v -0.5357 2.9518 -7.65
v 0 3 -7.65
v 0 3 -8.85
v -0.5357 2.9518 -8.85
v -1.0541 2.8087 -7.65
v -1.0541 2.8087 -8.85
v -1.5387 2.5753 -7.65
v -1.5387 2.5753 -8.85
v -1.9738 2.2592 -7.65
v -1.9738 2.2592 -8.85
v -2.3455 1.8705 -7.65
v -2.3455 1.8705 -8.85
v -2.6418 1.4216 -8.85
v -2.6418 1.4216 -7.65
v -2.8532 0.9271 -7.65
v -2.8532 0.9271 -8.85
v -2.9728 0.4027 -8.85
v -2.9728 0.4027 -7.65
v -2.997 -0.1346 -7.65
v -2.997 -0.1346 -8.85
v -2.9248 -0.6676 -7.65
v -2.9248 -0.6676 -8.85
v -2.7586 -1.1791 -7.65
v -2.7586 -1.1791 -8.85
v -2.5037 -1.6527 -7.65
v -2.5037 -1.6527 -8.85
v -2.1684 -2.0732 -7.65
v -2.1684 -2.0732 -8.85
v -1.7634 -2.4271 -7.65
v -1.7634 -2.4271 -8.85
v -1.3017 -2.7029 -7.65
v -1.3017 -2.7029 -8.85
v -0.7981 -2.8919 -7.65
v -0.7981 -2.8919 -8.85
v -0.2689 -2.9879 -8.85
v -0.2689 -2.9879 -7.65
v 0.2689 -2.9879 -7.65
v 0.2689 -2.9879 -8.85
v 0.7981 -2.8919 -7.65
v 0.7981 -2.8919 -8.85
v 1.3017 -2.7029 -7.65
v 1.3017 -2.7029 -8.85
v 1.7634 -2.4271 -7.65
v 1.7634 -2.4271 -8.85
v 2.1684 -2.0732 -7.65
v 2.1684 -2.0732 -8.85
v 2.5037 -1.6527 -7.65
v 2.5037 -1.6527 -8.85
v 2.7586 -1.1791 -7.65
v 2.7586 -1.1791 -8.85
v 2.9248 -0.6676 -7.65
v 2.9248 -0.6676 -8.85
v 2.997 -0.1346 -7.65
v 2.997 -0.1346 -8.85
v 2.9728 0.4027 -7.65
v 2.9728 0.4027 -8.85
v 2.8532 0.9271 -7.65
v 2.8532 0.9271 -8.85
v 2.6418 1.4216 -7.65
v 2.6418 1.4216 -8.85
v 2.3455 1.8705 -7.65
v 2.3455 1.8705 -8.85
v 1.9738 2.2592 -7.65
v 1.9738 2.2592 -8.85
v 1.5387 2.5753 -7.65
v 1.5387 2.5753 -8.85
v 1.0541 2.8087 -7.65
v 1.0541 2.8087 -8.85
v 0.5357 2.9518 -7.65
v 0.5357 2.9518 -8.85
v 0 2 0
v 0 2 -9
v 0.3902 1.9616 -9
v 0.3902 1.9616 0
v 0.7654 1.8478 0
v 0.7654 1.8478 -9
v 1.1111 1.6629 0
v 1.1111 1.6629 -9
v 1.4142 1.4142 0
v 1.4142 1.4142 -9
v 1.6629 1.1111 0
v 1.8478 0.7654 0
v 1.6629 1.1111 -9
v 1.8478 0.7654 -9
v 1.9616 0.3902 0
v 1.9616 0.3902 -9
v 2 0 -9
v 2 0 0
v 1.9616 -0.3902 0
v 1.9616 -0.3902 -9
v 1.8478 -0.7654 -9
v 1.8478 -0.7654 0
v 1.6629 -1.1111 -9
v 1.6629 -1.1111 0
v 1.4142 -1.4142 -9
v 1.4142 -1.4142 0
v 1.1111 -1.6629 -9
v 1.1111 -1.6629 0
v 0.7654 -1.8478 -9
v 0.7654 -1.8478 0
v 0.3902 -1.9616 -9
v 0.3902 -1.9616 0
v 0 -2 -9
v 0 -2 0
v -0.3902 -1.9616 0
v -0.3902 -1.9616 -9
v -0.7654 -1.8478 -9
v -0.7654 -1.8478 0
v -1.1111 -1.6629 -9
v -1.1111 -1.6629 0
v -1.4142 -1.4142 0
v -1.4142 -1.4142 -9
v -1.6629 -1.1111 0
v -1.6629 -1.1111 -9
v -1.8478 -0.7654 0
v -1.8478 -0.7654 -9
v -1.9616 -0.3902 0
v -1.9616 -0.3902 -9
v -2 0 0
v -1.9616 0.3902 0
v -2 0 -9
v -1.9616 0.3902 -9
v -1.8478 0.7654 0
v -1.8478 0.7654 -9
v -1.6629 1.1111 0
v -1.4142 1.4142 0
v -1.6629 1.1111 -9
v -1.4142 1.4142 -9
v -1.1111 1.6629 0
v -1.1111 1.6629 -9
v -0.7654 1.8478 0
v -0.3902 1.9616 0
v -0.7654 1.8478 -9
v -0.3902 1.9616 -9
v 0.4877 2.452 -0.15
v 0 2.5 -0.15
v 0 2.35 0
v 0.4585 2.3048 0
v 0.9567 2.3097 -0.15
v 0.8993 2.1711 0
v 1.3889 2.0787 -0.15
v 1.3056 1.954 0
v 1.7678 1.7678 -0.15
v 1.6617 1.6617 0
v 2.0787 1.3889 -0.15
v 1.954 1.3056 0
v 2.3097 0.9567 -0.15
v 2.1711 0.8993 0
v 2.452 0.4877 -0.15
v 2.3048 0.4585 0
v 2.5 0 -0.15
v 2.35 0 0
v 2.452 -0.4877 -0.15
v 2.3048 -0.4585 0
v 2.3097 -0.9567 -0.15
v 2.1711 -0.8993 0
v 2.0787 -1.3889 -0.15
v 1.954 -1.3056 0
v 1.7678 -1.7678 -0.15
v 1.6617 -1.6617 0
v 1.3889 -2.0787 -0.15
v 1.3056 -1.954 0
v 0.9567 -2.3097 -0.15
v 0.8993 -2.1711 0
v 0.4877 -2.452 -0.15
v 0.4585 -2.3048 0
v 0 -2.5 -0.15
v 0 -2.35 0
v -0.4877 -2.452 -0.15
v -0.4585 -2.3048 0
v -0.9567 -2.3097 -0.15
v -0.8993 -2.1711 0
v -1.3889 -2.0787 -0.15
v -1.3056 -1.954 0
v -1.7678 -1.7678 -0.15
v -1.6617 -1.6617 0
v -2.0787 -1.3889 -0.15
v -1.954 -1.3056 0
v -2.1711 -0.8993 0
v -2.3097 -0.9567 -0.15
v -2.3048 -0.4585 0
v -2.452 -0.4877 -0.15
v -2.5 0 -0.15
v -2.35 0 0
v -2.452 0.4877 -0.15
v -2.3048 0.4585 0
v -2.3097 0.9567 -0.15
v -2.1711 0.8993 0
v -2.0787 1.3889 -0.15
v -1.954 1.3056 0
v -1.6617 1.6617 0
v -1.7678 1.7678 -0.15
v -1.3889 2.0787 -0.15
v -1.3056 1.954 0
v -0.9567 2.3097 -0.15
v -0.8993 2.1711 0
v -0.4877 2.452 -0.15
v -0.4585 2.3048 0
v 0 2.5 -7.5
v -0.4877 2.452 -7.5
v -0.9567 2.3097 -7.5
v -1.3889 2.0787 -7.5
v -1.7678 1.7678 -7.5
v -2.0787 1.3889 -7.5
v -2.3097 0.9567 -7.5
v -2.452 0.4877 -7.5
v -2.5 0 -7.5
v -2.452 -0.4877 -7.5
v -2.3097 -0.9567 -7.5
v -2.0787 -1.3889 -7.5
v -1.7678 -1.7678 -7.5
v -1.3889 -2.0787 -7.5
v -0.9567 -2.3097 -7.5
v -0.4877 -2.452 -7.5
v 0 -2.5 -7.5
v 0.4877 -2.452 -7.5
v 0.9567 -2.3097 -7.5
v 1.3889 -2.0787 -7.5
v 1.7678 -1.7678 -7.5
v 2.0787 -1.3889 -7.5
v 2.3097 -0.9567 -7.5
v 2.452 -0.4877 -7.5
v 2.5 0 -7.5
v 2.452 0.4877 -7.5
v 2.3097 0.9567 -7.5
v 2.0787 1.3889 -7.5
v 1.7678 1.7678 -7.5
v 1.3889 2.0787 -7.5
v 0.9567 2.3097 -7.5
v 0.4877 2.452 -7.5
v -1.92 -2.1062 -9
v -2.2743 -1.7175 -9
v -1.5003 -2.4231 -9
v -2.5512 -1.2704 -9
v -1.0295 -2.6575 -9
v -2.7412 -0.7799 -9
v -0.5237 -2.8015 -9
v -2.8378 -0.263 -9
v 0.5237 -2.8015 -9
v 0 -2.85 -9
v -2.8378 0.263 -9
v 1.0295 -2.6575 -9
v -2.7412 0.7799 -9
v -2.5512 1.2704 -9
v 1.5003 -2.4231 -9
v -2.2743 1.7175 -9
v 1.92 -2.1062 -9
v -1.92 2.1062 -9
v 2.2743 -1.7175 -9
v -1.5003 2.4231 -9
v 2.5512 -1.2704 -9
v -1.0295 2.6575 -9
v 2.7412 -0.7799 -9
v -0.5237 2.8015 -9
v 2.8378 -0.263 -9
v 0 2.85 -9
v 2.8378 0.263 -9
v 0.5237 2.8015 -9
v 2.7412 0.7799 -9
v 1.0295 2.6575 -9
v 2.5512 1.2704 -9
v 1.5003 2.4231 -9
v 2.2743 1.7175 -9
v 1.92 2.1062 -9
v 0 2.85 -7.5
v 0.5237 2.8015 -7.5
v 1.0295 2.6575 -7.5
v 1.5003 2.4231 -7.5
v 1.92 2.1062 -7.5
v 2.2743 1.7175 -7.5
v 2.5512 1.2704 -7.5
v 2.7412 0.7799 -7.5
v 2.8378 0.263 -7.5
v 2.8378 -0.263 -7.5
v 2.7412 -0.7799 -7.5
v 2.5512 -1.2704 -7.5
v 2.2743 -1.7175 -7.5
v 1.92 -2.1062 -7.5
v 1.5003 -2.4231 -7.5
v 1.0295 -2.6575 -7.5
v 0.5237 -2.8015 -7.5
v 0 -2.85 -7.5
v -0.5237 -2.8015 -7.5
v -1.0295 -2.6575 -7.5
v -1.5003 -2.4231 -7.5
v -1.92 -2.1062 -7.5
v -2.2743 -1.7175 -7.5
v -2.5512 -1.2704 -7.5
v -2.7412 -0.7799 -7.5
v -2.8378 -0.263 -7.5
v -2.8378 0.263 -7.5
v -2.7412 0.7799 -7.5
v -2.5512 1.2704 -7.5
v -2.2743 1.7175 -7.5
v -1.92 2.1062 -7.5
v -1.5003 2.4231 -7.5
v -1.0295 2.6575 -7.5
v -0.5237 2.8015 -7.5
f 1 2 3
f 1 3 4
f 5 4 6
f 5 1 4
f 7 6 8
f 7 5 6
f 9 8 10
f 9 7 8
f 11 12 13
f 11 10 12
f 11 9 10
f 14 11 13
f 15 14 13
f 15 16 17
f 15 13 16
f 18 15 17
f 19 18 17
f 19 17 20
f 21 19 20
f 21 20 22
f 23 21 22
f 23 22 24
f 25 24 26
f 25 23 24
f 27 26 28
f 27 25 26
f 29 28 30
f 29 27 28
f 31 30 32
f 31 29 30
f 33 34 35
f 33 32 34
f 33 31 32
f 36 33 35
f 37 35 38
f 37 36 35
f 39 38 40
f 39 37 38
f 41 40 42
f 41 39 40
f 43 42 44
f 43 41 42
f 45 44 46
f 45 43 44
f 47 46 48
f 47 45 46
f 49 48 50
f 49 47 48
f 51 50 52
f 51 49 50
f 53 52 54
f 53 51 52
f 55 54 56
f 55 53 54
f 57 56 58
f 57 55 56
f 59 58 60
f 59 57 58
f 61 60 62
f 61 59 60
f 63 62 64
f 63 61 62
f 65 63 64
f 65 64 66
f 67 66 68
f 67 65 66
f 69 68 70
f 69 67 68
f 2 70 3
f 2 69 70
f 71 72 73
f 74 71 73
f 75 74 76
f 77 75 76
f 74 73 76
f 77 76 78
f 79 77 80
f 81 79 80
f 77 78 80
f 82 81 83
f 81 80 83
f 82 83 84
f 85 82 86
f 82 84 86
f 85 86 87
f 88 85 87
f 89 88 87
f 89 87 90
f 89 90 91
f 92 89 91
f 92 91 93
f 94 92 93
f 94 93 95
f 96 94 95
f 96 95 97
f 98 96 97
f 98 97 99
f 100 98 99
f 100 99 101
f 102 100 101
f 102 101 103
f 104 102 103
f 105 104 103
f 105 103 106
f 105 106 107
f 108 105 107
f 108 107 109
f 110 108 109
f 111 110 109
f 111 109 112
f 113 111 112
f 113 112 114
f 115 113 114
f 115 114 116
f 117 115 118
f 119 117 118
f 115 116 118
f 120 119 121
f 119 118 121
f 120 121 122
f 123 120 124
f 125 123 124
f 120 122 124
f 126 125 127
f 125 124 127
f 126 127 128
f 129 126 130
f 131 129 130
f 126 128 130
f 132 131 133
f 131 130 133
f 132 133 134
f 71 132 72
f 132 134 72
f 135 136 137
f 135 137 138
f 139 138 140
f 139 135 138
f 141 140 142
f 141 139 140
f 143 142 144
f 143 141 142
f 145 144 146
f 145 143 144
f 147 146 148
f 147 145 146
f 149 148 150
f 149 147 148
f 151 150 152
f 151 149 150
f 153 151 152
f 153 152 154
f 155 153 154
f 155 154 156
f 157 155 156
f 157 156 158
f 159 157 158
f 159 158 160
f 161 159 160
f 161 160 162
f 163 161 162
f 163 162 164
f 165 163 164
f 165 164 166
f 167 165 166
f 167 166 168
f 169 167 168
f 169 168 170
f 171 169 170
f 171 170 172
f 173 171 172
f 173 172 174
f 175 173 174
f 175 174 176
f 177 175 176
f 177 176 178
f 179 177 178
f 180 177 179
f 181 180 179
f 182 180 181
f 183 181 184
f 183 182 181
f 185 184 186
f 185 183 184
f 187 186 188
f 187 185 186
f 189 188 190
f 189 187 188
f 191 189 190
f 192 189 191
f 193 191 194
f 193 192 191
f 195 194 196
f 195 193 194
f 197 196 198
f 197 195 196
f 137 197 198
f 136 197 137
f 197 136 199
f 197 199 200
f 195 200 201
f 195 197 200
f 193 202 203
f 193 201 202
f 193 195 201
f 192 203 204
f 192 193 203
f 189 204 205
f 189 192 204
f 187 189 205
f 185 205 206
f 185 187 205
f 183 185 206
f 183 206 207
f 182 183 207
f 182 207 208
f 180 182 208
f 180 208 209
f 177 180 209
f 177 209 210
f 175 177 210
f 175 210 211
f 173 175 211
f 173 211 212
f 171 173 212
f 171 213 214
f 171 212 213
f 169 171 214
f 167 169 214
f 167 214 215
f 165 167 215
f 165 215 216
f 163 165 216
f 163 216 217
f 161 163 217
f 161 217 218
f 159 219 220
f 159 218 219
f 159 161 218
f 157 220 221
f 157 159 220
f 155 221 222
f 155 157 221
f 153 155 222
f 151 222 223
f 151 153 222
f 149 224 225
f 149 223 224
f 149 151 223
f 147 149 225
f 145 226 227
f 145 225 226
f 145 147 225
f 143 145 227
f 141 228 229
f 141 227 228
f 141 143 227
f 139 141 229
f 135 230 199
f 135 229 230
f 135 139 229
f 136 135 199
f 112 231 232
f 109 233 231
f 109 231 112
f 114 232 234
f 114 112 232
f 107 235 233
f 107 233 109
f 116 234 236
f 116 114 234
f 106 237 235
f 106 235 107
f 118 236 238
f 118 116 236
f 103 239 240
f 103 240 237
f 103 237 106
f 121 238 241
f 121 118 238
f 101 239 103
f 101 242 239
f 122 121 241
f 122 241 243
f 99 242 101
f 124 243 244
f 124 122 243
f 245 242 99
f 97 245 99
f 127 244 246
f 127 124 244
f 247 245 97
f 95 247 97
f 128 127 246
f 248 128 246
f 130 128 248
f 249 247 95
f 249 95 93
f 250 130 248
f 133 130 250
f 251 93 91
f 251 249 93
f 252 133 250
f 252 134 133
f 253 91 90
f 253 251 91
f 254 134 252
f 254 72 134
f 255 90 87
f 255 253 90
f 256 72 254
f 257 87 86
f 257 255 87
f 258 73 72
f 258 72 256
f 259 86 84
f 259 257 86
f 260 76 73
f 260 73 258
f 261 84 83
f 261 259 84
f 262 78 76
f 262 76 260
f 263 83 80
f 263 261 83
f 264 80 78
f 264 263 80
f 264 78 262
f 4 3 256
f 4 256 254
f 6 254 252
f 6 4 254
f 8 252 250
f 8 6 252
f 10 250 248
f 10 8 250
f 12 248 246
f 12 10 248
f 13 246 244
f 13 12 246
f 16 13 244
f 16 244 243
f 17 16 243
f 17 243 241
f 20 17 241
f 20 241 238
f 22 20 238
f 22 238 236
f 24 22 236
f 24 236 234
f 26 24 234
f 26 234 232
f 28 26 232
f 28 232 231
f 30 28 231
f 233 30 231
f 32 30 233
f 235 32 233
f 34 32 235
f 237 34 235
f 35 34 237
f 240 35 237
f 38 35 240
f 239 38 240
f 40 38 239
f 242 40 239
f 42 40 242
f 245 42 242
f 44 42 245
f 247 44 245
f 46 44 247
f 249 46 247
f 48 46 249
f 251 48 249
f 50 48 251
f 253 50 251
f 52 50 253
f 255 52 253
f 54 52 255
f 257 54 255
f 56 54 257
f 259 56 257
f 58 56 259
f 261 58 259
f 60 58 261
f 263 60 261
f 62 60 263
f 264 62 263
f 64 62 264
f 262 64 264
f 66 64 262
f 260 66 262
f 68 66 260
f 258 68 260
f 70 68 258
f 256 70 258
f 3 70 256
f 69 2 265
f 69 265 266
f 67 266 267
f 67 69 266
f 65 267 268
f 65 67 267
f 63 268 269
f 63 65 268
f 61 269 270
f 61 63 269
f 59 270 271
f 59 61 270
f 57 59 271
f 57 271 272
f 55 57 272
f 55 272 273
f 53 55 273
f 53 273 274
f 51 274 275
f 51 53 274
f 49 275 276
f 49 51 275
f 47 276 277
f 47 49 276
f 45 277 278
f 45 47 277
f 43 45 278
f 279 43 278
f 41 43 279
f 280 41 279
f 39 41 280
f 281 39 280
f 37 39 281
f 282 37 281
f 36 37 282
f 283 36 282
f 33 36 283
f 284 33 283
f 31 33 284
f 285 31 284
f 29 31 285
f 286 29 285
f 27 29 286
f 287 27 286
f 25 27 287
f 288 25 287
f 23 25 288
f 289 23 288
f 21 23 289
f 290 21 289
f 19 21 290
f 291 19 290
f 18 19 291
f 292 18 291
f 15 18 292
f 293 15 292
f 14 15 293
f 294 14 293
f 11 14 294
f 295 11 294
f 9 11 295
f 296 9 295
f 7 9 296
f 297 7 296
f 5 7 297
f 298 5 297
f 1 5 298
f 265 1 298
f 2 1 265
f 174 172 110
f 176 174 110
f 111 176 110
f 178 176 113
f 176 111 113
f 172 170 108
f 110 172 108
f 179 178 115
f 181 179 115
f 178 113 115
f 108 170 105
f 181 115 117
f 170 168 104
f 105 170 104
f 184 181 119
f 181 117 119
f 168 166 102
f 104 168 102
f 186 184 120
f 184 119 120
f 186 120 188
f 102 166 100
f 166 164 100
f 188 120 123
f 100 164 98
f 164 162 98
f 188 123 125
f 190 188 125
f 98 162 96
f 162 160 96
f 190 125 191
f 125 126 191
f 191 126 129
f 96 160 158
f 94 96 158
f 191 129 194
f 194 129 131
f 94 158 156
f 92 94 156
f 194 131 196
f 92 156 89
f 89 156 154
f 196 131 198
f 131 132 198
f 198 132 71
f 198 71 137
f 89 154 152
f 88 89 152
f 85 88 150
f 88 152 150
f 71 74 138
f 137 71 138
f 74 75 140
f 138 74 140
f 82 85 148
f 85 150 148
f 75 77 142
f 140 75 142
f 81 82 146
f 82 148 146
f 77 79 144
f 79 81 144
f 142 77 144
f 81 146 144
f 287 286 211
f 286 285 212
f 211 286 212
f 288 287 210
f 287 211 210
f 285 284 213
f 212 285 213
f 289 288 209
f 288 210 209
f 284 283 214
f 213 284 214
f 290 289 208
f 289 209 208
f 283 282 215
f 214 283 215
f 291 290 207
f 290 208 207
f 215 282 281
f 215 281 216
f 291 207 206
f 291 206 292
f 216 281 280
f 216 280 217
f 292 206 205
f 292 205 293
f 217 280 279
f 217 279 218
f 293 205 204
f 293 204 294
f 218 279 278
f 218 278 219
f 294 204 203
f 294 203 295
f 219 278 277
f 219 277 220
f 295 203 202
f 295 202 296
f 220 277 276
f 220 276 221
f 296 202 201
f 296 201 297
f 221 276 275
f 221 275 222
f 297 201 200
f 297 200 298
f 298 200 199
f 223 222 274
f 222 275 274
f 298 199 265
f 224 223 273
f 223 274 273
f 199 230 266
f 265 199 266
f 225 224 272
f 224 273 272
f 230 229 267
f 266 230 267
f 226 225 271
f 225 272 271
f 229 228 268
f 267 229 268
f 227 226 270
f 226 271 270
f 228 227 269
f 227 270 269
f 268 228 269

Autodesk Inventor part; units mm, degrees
ref_plane "YZ Plane" through (0, 0, 0) normal (1, 0, 0) x (0, 1, 0)
ref_plane "XZ Plane" through (0, 0, 0) normal (0, 1, 0) x (-1, 0, 0)
ref_plane "XY Plane" through (0, 0, 0) normal (0, 0, 1) x (1, 0, 0)
sketch "Sketch1" plane through (0, 0, 0) normal (1, 0, 0) x (0, 1, 0)
  line L0 (0, 0) -> (0, -9) construction
  line L1 (2, 0) -> (2, -9)
  line L2 (2, -9) -> (3, -9)
  line L3 (3, -9) -> (3, -7.5)
  line L4 (3, -7.5) -> (2.5, -7.5)
  line L5 (2.5, -7.5) -> (2.5, 0)
  line L6 (2.5, 0) -> (2, 0)
  line L7 (0, 0) -> (7.91, 0) construction
  dimension "d0" = 9
  dimension "d1" = 2
  dimension "d2" = 2.5
  dimension "d3" = 3
  dimension "d4" = 1.5
  dimension "d5" = 9
revolve "Revolution1" add sketch "Sketch1" angle 360 about axis through (0, 0, 0) along (0, 0, -1)
chamfer "Chamfer1" distance 0.15 angle 45 3 edges at (0, -3, -7.5) (0, -3, -9) (0, -2.5, 0)
properties part number "Component 5(Ram Bearing)"
